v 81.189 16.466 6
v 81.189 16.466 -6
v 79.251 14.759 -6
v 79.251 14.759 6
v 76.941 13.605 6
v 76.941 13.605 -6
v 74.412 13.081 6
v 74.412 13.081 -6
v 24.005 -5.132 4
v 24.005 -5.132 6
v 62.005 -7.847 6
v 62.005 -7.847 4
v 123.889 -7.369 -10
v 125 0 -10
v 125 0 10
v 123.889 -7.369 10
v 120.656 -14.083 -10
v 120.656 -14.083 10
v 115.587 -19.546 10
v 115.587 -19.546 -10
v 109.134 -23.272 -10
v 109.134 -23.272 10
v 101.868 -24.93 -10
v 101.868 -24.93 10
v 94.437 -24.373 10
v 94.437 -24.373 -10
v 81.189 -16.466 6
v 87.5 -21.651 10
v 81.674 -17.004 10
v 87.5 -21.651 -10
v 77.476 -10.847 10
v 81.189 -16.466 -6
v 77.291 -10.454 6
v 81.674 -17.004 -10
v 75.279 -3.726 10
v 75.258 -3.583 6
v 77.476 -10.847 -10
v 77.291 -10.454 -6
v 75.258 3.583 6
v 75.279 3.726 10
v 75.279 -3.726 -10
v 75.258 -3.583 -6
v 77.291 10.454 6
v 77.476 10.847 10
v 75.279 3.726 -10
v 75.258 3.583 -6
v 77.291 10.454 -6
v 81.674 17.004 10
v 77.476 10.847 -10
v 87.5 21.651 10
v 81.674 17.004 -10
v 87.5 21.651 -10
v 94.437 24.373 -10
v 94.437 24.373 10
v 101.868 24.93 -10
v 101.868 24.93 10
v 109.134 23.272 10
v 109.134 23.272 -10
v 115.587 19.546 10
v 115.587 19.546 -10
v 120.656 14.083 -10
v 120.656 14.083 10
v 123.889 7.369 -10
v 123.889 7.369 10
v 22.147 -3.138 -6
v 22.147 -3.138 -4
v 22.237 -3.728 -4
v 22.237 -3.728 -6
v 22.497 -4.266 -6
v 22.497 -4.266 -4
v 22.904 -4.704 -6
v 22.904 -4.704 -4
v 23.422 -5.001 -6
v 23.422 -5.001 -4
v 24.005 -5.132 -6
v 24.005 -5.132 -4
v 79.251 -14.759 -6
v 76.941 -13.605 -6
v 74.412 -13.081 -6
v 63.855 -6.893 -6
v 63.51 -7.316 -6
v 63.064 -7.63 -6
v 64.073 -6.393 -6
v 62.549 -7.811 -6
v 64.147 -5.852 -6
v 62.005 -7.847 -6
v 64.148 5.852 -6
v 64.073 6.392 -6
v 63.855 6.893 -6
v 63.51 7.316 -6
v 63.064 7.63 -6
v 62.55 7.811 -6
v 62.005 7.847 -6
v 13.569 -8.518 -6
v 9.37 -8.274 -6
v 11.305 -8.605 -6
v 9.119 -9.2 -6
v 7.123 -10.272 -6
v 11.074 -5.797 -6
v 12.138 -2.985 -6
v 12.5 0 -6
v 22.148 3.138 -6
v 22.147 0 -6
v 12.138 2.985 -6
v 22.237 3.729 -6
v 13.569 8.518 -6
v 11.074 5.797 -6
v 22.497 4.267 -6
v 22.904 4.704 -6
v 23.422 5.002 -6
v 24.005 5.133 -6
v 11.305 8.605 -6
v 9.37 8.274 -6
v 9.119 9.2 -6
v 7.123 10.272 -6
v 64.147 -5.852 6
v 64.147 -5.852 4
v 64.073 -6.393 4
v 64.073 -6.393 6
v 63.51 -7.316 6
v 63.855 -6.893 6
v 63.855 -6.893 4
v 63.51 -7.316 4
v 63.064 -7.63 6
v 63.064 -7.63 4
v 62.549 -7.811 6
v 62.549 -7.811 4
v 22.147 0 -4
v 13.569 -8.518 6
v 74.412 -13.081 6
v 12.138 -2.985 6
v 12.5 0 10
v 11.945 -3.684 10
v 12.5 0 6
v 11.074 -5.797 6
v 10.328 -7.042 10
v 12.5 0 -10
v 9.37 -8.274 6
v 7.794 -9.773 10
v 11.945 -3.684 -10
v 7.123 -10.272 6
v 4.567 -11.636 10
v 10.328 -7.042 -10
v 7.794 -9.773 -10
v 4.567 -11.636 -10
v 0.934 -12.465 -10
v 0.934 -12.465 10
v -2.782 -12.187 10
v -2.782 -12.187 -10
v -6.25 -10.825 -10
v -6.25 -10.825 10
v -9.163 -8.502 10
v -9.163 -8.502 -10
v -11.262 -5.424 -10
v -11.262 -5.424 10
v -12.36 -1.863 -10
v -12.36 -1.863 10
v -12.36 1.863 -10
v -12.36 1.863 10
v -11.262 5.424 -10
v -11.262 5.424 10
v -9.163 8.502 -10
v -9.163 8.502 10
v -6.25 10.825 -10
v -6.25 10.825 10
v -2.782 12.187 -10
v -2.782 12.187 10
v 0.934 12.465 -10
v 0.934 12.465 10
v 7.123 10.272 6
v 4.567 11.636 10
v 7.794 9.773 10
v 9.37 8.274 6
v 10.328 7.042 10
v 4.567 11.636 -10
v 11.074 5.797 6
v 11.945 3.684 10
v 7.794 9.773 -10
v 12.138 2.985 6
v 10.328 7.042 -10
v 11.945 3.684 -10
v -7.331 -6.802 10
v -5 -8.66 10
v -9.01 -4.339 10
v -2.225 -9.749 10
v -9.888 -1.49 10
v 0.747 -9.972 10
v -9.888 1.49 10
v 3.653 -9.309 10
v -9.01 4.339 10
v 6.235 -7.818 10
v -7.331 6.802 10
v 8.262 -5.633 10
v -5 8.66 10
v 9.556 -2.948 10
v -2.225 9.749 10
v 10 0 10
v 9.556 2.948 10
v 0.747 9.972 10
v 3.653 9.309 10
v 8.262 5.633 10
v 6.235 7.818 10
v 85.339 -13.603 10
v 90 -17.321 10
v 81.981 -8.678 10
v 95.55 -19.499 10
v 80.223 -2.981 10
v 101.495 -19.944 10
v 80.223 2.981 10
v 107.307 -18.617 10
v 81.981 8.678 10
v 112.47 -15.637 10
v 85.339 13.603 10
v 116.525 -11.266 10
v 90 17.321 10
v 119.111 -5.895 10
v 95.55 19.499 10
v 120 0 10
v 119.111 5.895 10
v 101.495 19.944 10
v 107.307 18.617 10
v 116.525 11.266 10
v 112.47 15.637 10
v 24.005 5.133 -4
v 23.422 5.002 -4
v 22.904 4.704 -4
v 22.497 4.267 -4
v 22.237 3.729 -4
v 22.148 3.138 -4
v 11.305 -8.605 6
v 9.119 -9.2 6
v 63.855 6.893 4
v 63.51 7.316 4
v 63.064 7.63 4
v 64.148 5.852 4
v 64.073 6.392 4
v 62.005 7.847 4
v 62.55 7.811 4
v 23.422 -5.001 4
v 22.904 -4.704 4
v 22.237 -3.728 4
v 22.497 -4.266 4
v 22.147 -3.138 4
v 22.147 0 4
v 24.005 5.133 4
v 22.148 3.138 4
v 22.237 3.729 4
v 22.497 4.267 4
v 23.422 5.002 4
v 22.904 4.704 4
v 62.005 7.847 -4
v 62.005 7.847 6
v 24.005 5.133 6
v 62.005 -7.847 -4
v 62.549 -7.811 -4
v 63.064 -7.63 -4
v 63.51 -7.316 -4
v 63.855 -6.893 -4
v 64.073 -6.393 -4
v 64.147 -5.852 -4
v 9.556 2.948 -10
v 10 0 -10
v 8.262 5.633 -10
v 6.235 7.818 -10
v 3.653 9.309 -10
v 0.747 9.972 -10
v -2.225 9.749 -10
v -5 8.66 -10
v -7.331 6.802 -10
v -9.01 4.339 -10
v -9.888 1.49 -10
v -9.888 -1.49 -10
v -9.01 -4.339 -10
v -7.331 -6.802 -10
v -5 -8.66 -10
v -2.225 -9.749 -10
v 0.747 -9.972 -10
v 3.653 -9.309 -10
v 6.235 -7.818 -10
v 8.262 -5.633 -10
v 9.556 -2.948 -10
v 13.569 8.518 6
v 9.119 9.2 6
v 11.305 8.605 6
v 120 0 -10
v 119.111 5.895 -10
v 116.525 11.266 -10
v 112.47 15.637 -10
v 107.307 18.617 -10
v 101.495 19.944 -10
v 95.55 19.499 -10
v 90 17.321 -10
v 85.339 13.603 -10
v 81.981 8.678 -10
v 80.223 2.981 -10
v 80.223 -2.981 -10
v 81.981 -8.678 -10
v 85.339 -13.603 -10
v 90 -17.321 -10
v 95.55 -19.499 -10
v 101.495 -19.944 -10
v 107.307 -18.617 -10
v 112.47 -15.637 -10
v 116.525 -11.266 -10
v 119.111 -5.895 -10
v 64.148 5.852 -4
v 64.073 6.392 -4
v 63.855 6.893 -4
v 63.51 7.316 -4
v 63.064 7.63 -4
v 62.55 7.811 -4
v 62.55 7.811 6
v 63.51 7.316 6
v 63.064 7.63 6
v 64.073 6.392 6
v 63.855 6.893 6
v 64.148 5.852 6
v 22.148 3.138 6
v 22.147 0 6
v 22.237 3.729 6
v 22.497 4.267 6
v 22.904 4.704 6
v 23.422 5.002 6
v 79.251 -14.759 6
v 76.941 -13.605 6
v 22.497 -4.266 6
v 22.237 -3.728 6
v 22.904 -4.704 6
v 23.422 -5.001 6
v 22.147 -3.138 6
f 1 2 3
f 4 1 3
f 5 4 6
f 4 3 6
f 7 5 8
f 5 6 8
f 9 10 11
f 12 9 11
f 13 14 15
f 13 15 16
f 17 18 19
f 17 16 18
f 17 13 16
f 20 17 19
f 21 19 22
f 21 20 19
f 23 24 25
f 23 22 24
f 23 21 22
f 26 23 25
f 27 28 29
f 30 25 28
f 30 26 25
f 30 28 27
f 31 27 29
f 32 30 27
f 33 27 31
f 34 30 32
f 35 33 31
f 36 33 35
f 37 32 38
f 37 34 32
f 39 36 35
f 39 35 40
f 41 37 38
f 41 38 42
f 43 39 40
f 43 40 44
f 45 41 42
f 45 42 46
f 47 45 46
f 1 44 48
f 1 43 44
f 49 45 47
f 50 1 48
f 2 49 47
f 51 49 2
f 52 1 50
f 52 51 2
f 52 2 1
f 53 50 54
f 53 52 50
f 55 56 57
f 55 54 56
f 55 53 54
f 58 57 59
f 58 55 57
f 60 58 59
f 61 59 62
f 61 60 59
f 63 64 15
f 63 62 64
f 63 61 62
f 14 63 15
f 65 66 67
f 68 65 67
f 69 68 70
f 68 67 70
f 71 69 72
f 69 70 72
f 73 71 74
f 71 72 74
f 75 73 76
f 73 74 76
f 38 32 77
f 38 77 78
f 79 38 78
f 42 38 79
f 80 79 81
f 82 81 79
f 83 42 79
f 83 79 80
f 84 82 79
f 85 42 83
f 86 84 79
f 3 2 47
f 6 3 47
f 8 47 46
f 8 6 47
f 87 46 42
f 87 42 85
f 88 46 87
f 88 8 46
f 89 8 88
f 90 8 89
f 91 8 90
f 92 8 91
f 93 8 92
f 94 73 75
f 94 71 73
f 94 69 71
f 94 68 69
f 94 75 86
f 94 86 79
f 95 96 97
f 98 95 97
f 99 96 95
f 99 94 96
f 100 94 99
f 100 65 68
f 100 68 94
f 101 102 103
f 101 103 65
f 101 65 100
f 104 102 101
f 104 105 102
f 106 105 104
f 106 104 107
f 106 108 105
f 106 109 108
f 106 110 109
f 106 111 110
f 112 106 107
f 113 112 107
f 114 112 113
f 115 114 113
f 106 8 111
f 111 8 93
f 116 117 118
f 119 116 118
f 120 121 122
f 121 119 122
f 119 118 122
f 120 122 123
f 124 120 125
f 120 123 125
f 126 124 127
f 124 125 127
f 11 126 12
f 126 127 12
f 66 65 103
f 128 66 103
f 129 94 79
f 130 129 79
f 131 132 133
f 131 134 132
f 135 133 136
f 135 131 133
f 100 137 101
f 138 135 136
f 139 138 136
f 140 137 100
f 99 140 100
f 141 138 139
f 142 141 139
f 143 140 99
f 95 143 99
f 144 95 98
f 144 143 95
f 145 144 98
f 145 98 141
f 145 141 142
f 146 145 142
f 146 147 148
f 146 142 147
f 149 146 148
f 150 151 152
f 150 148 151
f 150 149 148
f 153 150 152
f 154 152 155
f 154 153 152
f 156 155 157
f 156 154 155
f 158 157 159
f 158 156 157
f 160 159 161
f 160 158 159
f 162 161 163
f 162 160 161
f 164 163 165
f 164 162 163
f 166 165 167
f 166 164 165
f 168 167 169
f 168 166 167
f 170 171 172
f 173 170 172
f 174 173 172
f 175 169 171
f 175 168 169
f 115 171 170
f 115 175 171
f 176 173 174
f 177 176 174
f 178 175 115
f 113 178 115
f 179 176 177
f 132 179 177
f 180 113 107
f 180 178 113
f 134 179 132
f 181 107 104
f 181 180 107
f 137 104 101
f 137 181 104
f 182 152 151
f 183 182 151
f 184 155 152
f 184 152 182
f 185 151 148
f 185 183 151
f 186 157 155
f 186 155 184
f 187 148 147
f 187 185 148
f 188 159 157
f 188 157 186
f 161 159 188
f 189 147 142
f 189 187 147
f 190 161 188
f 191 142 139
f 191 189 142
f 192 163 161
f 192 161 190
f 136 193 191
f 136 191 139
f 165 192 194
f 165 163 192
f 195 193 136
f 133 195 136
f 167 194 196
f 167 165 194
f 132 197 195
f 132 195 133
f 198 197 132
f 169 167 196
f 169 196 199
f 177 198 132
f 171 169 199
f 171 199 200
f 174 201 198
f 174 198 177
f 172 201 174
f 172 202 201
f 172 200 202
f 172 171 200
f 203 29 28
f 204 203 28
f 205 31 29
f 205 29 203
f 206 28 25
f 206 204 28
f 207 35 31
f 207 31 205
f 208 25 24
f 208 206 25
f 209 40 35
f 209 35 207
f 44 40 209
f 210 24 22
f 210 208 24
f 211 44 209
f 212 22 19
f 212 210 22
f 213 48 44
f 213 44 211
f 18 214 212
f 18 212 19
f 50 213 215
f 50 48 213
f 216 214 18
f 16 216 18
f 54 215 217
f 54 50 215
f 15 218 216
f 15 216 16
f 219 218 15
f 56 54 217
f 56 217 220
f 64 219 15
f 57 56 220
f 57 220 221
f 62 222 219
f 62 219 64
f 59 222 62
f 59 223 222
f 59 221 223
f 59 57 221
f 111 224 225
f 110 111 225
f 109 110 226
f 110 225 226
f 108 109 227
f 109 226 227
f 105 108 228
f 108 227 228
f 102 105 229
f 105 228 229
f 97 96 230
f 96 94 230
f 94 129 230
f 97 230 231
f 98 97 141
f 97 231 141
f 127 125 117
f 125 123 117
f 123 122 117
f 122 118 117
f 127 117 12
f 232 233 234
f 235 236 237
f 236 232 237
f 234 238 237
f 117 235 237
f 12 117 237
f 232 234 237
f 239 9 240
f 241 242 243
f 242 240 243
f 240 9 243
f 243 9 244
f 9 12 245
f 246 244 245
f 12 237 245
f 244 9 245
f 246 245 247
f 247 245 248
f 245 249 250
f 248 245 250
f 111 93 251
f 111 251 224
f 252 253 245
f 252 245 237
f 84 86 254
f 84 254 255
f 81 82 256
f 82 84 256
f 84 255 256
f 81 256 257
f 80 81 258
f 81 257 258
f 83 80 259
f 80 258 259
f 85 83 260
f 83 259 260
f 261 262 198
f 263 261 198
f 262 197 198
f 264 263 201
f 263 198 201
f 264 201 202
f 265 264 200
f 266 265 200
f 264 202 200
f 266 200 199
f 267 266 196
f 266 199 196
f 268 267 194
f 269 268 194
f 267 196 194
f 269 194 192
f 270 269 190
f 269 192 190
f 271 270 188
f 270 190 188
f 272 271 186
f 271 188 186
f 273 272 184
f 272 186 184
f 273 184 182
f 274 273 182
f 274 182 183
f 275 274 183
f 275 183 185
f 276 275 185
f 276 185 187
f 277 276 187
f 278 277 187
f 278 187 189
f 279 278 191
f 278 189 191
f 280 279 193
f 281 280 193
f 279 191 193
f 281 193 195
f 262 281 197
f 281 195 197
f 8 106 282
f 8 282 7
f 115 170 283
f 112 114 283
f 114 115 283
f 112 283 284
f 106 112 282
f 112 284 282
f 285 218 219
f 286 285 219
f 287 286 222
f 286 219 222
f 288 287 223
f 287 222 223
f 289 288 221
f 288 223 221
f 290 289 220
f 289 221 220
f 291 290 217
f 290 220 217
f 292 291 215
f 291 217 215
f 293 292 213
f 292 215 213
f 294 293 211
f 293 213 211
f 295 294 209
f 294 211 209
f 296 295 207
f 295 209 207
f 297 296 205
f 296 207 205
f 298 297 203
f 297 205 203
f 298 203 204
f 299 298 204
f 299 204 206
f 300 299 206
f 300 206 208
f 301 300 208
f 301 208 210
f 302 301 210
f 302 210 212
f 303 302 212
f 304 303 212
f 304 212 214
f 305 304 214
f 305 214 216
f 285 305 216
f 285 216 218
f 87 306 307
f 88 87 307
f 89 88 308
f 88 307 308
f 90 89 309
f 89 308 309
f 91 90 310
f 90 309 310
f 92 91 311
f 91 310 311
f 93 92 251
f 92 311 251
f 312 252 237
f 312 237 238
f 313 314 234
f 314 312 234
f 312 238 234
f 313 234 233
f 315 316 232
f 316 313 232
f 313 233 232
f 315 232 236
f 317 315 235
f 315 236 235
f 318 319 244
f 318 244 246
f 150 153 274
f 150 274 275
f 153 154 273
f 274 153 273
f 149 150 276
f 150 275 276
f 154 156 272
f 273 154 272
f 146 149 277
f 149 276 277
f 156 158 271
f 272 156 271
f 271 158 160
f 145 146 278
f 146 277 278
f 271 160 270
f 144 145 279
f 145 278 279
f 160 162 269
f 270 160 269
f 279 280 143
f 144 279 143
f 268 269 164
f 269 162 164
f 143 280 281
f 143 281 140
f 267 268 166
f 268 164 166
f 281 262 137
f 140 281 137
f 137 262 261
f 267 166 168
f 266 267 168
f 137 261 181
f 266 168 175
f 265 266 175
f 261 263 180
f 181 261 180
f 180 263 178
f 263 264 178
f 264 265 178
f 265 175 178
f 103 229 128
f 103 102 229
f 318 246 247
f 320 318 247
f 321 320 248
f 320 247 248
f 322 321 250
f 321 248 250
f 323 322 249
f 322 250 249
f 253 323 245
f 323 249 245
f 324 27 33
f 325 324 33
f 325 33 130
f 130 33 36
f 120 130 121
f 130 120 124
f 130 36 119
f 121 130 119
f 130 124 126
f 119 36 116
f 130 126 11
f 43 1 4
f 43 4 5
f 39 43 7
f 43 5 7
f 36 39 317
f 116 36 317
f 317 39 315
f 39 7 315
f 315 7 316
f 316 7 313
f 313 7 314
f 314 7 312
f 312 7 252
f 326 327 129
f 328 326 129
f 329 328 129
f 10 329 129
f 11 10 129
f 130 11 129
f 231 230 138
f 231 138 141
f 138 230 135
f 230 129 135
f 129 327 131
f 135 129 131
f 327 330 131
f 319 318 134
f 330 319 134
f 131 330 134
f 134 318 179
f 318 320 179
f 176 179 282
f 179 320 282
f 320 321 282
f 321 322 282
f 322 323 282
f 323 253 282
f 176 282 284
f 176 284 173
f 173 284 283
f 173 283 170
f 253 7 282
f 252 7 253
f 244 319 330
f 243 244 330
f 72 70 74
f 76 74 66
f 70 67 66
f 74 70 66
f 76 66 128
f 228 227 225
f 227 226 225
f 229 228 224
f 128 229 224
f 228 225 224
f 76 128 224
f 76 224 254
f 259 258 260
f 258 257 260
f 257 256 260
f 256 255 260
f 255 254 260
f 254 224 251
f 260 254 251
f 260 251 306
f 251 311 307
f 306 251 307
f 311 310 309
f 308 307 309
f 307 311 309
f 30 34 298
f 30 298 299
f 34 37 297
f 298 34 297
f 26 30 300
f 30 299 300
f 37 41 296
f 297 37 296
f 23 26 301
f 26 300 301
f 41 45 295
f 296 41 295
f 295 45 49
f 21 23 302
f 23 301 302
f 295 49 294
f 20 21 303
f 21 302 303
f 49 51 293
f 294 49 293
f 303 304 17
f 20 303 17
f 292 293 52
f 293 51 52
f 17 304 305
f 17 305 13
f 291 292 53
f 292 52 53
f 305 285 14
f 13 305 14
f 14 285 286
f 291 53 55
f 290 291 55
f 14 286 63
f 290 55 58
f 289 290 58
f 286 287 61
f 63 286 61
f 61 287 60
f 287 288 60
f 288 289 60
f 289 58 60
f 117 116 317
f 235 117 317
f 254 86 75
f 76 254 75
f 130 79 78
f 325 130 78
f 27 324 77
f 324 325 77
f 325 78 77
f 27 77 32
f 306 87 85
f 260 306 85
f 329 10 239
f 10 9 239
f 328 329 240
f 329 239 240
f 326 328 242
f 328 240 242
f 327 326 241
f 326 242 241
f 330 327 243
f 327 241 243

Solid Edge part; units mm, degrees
sketch "Sketch1" plane through (0, 0, 0) normal (0, 0, 1) x (1, 0, 0)
  line L0 (0, 0) -> (0, 7.5)
  line L1 (0, 7.5) -> (100, 15)
  line L2 (100, 0) -> (100, 15)
  line L3 (100, 0) -> (100, -15)
  line L4 (0, -7.5) -> (100, -15)
  line L5 (0, 0) -> (0, -7.5)
  dimension "D1" = 7.5
  dimension "D2" = 7.5
  dimension "D3" = 15
  dimension "D4" = 15
extrude "Protrusion1" add sketch "Sketch1" along normal mid plane 12
sketch "Sketch2" plane through (0, 0, 0) normal (0, 0, 1) x (1, 0, 0)
  circle A0 centre (100, 0) radius 25
  circle A1 centre (0, 0) radius 12.5
  dimension "D1" = 25
  dimension "D2" = 50
extrude "ExtrudedProtrusion_2" add sketch "Sketch2" along normal mid plane 20
sketch "Sketch3" plane through (0, 0, 10) normal (0, 0, 1) x (1, 0, 0)
  circle A0 centre (100, 0) radius 20
  circle A1 centre (0, 0) radius 10
  dimension "D1" = 20
  dimension "D2" = 40
extrude "ExtrudedCutout_1" cut sketch "Sketch3" against normal blind 35.3576
fillet "Round_1" radius 10 4 edges at (9.4283, 8.2071, 0) (78.906, 13.4179, 0) (9.4283, -8.2071, 0) (78.906, -13.4179, 0)
sketch "Sketch4" plane through (44.1559, 0, 6) normal (0, 0, 1) x (0.9972, -0.0748, 0)
  line L0 (-21.9468, -1.646) -> (-22.3207, 3.34)
  line L1 (-22.3207, 3.34) -> (19.3373, 9.4728)
  line L2 (19.9356, 1.4952) -> (19.3373, 9.4728)
  line L3 (19.9356, 1.4952) -> (20.5339, -6.4824)
  line L4 (-21.5728, -6.632) -> (20.5339, -6.4824)
  line L5 (-21.9468, -1.646) -> (-21.5728, -6.632)
  dimension "D1" = 5
  dimension "D2" = 5
  dimension "D3" = 8
  dimension "D4" = 8
extrude "ExtrudedCutout_2" cut sketch "Sketch4" against normal blind 2
mirror "Mirror1" about plane through (0, 0, 0) normal (0, 0, 1) of "ExtrudedCutout_2"
fillet "Round_3" radius 2 8 edges at (22.1475, 5, 5) (22.1475, -5, 5) (22.1475, 5, -5) (22.1475, -5, -5) (64.1475, 8, 5) (64.1475, -8, 5) (64.1475, 8, -5) (64.1475, -8, -5)
properties part number "5" material "Forged Steel"
